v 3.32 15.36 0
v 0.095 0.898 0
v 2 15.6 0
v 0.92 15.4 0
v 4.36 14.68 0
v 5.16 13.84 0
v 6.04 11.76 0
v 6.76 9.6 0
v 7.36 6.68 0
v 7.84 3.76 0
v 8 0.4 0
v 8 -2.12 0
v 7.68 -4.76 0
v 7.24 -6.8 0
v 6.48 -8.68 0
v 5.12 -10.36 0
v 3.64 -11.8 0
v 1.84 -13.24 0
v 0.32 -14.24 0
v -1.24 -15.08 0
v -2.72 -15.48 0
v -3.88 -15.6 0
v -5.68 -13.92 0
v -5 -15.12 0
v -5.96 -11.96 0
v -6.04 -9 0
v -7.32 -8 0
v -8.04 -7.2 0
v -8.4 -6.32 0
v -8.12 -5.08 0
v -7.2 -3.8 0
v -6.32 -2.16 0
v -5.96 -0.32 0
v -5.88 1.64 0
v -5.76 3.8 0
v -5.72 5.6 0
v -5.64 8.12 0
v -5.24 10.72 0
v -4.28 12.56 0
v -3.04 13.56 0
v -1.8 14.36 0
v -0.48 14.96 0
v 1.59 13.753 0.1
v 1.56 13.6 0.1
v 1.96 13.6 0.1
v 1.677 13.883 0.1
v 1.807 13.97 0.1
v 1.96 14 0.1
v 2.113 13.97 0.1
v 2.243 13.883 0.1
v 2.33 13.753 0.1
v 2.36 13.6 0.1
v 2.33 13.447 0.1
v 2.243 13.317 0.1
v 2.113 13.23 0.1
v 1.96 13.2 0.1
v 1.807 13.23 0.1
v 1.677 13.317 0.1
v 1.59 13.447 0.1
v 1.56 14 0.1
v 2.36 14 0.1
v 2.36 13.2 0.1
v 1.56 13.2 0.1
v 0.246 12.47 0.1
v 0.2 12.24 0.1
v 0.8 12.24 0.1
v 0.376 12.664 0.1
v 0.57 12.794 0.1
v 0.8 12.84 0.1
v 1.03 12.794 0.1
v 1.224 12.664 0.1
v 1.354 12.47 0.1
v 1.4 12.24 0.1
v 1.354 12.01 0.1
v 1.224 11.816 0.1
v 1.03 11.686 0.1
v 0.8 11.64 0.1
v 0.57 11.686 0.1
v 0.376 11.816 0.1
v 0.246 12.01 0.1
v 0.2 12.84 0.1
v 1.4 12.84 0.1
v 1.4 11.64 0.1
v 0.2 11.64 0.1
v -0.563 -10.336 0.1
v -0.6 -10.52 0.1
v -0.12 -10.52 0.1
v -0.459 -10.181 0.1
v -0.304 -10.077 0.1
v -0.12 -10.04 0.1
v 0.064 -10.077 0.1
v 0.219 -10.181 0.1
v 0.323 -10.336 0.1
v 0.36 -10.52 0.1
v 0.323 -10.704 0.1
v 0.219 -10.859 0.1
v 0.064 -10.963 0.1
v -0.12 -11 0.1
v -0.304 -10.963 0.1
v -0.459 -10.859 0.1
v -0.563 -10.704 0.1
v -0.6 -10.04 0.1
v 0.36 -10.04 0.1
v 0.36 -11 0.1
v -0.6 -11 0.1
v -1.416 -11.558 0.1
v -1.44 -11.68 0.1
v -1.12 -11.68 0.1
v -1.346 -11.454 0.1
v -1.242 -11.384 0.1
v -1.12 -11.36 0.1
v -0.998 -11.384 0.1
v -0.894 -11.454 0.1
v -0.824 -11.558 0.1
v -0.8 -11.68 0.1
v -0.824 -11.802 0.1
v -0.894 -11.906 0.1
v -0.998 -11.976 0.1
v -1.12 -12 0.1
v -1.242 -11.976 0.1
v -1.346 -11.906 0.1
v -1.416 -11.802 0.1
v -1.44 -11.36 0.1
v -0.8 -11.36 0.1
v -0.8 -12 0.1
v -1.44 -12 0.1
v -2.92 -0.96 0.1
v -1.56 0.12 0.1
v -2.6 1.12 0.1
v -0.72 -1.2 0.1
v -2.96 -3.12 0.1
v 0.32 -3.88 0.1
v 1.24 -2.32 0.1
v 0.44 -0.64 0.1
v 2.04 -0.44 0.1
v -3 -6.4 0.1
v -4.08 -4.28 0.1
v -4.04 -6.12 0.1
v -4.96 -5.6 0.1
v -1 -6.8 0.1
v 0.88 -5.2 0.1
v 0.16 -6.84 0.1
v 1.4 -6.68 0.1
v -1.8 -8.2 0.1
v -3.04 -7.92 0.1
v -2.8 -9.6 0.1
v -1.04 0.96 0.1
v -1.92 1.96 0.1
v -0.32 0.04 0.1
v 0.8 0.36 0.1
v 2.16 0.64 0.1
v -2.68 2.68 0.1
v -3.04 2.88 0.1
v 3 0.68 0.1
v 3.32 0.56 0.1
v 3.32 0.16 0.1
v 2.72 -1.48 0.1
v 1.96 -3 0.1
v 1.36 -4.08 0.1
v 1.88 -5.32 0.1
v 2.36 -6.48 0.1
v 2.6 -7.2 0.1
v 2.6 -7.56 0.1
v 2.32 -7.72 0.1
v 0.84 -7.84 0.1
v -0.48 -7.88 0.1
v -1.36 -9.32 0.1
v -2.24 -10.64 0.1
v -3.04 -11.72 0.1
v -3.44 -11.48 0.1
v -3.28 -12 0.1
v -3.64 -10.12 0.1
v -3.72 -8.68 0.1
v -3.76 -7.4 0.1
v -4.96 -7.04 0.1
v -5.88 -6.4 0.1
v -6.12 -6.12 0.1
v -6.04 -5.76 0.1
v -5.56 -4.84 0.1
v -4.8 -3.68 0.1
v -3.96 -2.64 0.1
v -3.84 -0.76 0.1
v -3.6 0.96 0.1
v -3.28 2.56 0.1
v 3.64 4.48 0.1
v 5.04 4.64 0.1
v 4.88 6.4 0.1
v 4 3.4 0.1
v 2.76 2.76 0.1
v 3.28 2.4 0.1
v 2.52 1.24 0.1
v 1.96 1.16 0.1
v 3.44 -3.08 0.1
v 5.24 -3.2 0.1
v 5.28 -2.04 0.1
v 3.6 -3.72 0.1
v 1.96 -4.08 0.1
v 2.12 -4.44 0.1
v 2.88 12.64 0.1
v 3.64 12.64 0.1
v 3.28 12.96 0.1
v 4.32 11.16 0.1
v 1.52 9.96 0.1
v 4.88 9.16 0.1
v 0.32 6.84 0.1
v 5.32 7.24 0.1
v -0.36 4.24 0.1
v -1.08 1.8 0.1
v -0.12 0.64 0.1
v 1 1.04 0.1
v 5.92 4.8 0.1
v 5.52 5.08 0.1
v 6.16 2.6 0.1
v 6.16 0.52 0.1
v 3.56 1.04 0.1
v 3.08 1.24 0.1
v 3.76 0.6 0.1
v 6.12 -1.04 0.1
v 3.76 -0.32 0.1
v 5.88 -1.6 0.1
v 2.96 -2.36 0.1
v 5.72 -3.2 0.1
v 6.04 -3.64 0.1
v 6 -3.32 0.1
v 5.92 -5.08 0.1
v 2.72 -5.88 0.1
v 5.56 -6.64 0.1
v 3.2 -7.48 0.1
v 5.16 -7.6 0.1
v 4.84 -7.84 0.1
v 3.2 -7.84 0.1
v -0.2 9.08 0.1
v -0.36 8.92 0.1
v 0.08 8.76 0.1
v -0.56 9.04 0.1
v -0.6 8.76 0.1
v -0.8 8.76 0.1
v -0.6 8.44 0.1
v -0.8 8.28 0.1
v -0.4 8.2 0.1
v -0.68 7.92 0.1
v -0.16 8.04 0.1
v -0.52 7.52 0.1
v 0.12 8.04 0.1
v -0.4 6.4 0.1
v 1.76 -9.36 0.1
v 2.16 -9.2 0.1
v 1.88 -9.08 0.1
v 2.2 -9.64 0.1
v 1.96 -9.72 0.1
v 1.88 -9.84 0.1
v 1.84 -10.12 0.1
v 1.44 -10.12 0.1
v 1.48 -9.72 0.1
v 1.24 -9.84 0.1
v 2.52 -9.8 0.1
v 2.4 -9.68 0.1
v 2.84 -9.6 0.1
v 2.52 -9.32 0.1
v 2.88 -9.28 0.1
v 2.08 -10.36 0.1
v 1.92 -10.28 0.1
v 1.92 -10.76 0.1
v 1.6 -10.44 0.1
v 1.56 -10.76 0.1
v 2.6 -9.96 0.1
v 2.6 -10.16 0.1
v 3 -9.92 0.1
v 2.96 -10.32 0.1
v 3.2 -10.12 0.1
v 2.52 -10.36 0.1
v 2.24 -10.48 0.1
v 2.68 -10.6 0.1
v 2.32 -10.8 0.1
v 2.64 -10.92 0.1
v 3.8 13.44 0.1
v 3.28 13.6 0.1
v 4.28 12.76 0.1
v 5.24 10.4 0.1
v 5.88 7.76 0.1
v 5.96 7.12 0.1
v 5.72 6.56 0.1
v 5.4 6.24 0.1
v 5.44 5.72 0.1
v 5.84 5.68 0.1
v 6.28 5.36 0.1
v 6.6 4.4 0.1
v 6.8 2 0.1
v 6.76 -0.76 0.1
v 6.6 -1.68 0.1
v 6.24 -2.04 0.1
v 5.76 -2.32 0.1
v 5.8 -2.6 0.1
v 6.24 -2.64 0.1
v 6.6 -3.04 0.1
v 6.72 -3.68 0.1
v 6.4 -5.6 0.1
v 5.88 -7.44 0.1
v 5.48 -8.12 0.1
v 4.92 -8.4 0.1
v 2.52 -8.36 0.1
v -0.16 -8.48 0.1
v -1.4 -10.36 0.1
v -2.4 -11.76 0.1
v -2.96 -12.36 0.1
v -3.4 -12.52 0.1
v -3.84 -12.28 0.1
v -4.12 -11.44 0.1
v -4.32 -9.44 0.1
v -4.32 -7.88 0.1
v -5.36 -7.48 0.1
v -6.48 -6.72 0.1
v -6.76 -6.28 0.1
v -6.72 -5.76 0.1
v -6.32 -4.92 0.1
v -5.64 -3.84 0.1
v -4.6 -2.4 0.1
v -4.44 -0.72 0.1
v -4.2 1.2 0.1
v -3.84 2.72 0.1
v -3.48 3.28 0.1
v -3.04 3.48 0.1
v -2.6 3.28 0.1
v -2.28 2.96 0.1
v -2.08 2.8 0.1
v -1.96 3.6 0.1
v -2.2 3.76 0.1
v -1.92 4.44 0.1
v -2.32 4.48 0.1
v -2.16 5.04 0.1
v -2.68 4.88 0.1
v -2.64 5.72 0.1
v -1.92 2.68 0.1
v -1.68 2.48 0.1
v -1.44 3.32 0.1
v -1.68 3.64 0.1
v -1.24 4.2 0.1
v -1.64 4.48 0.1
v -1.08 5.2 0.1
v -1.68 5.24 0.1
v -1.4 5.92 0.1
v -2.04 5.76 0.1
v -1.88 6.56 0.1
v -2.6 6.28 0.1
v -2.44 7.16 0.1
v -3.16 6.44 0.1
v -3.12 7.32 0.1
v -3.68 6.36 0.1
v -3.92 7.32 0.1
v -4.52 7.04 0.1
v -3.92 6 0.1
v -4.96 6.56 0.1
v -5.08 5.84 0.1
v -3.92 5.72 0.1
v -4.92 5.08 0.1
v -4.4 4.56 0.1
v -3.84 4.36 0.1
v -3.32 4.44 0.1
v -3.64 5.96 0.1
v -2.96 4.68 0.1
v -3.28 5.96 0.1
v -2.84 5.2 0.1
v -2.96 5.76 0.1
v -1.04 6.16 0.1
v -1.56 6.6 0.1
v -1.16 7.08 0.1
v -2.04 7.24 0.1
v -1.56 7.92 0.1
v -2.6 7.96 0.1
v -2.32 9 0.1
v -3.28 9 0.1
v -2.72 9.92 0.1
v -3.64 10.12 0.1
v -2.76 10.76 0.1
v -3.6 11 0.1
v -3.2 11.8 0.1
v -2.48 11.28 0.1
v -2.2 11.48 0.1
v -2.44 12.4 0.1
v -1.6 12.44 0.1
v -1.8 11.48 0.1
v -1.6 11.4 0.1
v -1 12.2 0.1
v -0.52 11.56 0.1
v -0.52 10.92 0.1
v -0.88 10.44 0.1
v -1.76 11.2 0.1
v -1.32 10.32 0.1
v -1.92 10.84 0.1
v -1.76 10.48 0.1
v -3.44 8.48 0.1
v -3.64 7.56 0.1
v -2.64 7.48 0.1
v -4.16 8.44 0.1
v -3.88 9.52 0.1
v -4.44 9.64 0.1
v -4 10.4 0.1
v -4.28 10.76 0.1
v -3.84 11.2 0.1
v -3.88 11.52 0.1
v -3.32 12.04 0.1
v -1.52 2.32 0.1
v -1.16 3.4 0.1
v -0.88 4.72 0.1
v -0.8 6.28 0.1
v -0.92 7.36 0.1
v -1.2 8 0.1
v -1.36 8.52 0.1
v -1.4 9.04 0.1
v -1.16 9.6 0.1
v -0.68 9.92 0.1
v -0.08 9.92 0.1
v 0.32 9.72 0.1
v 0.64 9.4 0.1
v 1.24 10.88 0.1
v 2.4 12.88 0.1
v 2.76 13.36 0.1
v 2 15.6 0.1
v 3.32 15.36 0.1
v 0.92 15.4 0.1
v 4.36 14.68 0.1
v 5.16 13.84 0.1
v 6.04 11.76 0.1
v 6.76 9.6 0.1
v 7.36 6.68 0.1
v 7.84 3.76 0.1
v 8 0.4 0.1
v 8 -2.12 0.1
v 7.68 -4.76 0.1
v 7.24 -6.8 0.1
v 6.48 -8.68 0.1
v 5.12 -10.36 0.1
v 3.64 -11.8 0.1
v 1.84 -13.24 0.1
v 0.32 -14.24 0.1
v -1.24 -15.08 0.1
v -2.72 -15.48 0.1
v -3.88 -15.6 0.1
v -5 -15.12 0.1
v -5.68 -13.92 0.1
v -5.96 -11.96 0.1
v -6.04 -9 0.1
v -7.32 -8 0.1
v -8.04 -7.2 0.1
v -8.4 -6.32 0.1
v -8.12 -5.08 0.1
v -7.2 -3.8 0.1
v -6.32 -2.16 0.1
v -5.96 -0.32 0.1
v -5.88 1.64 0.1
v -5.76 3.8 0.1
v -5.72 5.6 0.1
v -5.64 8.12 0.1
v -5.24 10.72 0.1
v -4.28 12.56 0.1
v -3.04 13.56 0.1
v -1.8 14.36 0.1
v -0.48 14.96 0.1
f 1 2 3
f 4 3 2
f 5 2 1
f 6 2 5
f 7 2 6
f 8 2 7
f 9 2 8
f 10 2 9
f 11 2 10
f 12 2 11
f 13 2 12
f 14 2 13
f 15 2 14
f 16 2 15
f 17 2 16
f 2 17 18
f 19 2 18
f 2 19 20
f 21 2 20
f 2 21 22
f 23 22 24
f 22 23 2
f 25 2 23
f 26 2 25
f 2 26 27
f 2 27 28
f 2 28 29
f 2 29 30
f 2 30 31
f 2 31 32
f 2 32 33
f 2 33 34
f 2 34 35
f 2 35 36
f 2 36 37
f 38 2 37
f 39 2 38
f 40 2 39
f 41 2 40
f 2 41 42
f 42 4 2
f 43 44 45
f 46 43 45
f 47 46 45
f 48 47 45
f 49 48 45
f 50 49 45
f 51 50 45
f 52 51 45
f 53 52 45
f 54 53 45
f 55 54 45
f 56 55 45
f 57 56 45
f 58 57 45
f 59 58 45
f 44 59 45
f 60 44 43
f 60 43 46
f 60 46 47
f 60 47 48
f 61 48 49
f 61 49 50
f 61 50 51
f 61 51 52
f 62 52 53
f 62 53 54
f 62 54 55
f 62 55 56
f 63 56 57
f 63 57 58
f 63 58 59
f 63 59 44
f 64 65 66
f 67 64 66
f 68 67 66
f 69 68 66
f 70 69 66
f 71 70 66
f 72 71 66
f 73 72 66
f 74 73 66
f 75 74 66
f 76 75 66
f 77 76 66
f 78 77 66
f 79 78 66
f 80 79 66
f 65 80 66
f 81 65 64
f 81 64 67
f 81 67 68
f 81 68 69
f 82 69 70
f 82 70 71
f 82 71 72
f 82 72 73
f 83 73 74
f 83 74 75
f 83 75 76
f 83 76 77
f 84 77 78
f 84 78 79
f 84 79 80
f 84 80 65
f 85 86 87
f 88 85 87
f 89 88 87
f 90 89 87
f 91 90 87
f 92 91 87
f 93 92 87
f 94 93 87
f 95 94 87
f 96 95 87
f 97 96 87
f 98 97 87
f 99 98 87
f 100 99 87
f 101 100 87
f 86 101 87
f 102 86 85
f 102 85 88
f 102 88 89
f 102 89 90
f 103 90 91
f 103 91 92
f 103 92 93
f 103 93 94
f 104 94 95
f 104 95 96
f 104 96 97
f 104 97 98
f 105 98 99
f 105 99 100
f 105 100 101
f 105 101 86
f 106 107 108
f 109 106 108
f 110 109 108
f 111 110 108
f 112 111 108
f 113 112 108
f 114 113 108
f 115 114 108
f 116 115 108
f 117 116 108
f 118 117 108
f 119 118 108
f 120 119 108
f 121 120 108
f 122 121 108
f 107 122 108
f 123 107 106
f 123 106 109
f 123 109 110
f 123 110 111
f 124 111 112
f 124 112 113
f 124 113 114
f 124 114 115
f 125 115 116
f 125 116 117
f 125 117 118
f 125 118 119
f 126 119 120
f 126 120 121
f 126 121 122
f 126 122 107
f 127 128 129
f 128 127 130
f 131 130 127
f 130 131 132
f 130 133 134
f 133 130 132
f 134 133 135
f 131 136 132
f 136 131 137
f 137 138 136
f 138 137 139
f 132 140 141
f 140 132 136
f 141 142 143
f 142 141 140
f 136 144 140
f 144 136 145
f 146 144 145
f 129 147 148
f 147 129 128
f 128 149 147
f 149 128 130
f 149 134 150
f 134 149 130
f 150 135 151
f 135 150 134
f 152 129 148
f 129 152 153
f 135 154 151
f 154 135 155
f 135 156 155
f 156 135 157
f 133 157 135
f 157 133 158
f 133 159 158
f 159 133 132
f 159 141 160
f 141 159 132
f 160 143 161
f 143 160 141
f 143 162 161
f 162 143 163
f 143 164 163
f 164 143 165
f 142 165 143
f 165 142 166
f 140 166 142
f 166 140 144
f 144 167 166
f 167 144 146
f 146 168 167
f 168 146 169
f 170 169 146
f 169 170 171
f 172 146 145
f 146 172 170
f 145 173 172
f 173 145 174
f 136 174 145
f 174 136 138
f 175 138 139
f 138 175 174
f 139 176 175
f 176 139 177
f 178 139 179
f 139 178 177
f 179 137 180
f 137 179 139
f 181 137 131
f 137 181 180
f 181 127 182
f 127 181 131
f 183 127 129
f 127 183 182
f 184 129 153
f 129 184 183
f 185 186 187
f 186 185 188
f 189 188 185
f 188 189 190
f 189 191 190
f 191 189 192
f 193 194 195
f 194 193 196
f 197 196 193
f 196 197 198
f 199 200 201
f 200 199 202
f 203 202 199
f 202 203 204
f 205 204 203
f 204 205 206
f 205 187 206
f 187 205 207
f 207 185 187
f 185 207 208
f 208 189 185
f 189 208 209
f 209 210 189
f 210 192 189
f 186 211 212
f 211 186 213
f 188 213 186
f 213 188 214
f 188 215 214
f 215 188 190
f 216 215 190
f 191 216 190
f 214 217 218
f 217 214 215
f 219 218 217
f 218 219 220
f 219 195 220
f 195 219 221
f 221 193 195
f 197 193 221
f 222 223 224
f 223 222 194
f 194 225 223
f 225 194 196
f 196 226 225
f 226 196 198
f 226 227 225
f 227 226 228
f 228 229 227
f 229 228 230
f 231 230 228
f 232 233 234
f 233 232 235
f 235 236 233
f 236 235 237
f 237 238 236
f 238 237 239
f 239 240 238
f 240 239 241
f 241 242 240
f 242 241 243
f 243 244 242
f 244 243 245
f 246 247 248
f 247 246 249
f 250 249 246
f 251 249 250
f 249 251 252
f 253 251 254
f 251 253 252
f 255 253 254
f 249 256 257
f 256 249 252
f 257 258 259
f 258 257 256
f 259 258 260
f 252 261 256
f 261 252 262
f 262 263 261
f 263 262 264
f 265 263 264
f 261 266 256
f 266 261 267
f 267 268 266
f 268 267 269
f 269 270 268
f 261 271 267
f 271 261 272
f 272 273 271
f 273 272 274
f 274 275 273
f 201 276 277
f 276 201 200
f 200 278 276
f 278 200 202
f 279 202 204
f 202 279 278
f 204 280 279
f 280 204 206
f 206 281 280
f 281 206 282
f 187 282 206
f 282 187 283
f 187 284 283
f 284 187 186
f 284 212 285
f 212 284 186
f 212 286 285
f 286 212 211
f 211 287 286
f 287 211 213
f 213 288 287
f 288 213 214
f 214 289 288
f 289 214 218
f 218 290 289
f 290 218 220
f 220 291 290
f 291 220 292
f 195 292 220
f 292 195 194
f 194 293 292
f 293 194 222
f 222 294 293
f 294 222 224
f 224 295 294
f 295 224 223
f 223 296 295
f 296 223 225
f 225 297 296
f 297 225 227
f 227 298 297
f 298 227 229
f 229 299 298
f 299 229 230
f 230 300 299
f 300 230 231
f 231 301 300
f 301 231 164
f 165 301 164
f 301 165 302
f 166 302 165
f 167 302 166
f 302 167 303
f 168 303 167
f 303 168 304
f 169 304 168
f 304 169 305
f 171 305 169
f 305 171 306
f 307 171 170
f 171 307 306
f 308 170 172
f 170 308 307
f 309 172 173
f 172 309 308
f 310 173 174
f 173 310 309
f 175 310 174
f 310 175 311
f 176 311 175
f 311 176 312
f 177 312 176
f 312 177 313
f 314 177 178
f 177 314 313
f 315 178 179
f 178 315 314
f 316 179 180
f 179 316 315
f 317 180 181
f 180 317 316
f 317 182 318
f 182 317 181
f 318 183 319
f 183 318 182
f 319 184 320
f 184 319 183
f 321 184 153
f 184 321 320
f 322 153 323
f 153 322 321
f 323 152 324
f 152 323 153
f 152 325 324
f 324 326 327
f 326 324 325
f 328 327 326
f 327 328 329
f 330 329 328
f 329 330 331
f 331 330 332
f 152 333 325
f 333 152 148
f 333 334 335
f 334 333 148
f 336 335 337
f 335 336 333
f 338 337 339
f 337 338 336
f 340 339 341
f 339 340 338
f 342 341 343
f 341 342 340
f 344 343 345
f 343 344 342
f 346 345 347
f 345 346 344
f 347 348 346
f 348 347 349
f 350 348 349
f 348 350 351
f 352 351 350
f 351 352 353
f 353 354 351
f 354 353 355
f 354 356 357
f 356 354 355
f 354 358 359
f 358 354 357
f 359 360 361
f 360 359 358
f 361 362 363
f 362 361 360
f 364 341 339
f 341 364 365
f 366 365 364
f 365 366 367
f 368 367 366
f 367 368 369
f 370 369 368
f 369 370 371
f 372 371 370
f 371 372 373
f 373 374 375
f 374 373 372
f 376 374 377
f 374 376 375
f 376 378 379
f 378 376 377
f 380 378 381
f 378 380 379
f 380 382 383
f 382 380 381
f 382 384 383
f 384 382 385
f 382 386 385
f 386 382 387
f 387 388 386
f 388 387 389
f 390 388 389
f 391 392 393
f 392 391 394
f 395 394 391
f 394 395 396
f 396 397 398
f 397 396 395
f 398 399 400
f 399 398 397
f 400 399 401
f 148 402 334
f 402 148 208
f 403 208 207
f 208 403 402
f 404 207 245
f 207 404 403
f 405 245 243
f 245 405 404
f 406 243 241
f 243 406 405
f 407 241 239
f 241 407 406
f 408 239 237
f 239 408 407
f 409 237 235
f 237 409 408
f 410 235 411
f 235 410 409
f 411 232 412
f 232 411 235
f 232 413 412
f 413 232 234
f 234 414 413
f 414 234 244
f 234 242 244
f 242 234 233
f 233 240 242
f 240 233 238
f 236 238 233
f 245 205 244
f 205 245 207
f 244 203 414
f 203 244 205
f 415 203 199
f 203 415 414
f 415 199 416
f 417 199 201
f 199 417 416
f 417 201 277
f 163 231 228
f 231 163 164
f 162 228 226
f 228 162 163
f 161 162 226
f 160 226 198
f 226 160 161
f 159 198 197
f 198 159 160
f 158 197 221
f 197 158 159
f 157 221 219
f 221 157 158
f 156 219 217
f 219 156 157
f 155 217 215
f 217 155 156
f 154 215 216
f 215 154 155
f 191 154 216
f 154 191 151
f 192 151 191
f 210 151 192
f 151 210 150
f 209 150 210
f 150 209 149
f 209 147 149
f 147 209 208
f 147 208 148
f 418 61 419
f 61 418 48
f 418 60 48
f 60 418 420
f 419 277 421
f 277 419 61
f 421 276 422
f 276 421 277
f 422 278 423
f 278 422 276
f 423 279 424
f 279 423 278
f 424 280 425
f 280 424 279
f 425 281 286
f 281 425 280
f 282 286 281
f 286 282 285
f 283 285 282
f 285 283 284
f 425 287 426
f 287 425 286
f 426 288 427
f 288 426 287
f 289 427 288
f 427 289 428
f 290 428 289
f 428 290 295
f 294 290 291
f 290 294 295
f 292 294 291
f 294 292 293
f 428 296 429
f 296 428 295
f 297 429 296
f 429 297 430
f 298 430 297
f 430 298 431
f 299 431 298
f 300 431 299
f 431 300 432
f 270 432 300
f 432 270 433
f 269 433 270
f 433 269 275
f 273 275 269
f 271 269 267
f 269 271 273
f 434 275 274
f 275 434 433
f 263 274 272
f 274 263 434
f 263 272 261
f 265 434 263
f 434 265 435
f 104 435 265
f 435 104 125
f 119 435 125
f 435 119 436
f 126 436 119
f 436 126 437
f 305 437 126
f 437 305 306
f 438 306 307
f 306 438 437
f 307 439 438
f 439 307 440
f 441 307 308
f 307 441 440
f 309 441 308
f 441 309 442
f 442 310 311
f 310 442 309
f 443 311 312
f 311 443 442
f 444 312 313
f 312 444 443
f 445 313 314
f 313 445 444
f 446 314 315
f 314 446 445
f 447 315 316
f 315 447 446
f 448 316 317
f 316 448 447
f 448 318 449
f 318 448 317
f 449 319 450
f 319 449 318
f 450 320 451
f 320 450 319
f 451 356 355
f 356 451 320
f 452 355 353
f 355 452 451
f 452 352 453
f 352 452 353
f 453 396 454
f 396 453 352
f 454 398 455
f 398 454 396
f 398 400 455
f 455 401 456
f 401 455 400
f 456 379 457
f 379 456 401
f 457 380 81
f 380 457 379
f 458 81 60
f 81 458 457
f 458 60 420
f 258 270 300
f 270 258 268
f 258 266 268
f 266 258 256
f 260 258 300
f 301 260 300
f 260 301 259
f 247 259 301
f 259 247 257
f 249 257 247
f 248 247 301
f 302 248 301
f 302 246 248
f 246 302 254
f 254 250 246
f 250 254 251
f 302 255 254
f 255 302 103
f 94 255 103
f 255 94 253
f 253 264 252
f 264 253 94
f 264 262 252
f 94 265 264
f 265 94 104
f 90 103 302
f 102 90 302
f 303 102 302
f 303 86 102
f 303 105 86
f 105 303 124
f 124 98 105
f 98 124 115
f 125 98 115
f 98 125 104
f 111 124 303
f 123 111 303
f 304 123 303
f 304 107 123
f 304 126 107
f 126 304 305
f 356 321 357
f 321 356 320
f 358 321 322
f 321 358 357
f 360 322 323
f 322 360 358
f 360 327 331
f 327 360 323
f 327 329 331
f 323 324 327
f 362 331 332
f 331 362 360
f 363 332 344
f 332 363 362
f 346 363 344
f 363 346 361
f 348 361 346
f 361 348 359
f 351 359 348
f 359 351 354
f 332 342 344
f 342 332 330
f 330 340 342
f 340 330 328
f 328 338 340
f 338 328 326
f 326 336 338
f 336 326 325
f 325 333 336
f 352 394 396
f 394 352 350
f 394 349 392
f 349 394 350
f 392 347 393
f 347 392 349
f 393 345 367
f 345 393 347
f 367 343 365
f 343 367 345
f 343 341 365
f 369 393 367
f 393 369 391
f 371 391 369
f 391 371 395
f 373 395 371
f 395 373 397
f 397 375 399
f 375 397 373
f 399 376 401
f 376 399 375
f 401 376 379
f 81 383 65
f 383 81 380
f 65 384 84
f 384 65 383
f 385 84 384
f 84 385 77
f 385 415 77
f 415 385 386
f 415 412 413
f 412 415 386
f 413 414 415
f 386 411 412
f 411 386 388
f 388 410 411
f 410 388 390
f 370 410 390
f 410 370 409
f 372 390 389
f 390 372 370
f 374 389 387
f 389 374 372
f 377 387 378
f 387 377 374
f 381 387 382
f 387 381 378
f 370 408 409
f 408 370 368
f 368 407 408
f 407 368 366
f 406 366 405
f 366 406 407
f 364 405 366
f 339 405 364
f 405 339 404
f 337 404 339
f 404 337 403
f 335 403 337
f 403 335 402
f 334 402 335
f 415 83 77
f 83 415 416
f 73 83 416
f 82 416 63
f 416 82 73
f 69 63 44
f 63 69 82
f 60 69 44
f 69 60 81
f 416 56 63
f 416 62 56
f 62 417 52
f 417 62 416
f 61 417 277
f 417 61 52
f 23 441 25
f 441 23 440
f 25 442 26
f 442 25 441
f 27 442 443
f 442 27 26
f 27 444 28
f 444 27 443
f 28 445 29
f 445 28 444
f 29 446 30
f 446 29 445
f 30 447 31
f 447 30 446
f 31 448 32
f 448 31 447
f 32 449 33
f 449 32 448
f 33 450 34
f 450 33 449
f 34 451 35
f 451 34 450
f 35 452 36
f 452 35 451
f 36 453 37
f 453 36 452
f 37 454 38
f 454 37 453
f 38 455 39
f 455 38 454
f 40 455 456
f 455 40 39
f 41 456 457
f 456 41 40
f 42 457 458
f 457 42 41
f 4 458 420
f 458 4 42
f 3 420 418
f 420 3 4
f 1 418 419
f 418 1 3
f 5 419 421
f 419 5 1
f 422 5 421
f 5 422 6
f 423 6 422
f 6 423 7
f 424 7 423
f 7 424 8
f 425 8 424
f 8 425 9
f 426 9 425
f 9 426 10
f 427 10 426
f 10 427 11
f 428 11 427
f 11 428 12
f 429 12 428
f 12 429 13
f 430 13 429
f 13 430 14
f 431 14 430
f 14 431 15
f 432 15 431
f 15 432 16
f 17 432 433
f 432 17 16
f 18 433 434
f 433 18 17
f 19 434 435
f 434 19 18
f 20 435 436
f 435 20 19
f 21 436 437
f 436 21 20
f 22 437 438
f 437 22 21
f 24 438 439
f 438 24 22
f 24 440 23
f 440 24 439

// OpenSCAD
use <../lib.scad>
use <4650853b.scad>
function ldraw_lib__4650853c() = [
// 0 Sticker  3.9 x  2.1 with Magenta Star on Butterfly Wing, Left
// 0 Name: 4650853c.dat
// 0 Author: Takeshi Takahashi [RainbowDolphin]
// 0 !LDRAW_ORG Part UPDATE 2020-03
// 0 !LICENSE Licensed under CC BY 4.0 : see CAreadme.txt
// 
// 0 BFC CERTIFY CCW
  [0,"BFC","CERTIFY"],
  [0,"BFC","CCW"],
// 
// 0 !KEYWORDS Airplane Tail, Flying Club, Set 3063
// 
// 0 !HISTORY 2020-12-29 [PTadmin] Official Update 2020-03
// 
// 
// 1 16 0 0 0 -1 0 0 0 1 0 0 0 1 4650853b.dat
  [1,16,0,0,0,-1,0,0,0,1,0,0,0,1, ldraw_lib__4650853b()],
];
module ldraw_lib__4650853c(step=0, col=false, unit=2/5, alt=false, line=0.2, solid=!$preview)
    makepoly(ldraw_lib__4650853c(), step=step, col=col, unit=unit, alt=alt, line=line, solid=solid);
ldraw_lib__4650853c(line=0.2);
